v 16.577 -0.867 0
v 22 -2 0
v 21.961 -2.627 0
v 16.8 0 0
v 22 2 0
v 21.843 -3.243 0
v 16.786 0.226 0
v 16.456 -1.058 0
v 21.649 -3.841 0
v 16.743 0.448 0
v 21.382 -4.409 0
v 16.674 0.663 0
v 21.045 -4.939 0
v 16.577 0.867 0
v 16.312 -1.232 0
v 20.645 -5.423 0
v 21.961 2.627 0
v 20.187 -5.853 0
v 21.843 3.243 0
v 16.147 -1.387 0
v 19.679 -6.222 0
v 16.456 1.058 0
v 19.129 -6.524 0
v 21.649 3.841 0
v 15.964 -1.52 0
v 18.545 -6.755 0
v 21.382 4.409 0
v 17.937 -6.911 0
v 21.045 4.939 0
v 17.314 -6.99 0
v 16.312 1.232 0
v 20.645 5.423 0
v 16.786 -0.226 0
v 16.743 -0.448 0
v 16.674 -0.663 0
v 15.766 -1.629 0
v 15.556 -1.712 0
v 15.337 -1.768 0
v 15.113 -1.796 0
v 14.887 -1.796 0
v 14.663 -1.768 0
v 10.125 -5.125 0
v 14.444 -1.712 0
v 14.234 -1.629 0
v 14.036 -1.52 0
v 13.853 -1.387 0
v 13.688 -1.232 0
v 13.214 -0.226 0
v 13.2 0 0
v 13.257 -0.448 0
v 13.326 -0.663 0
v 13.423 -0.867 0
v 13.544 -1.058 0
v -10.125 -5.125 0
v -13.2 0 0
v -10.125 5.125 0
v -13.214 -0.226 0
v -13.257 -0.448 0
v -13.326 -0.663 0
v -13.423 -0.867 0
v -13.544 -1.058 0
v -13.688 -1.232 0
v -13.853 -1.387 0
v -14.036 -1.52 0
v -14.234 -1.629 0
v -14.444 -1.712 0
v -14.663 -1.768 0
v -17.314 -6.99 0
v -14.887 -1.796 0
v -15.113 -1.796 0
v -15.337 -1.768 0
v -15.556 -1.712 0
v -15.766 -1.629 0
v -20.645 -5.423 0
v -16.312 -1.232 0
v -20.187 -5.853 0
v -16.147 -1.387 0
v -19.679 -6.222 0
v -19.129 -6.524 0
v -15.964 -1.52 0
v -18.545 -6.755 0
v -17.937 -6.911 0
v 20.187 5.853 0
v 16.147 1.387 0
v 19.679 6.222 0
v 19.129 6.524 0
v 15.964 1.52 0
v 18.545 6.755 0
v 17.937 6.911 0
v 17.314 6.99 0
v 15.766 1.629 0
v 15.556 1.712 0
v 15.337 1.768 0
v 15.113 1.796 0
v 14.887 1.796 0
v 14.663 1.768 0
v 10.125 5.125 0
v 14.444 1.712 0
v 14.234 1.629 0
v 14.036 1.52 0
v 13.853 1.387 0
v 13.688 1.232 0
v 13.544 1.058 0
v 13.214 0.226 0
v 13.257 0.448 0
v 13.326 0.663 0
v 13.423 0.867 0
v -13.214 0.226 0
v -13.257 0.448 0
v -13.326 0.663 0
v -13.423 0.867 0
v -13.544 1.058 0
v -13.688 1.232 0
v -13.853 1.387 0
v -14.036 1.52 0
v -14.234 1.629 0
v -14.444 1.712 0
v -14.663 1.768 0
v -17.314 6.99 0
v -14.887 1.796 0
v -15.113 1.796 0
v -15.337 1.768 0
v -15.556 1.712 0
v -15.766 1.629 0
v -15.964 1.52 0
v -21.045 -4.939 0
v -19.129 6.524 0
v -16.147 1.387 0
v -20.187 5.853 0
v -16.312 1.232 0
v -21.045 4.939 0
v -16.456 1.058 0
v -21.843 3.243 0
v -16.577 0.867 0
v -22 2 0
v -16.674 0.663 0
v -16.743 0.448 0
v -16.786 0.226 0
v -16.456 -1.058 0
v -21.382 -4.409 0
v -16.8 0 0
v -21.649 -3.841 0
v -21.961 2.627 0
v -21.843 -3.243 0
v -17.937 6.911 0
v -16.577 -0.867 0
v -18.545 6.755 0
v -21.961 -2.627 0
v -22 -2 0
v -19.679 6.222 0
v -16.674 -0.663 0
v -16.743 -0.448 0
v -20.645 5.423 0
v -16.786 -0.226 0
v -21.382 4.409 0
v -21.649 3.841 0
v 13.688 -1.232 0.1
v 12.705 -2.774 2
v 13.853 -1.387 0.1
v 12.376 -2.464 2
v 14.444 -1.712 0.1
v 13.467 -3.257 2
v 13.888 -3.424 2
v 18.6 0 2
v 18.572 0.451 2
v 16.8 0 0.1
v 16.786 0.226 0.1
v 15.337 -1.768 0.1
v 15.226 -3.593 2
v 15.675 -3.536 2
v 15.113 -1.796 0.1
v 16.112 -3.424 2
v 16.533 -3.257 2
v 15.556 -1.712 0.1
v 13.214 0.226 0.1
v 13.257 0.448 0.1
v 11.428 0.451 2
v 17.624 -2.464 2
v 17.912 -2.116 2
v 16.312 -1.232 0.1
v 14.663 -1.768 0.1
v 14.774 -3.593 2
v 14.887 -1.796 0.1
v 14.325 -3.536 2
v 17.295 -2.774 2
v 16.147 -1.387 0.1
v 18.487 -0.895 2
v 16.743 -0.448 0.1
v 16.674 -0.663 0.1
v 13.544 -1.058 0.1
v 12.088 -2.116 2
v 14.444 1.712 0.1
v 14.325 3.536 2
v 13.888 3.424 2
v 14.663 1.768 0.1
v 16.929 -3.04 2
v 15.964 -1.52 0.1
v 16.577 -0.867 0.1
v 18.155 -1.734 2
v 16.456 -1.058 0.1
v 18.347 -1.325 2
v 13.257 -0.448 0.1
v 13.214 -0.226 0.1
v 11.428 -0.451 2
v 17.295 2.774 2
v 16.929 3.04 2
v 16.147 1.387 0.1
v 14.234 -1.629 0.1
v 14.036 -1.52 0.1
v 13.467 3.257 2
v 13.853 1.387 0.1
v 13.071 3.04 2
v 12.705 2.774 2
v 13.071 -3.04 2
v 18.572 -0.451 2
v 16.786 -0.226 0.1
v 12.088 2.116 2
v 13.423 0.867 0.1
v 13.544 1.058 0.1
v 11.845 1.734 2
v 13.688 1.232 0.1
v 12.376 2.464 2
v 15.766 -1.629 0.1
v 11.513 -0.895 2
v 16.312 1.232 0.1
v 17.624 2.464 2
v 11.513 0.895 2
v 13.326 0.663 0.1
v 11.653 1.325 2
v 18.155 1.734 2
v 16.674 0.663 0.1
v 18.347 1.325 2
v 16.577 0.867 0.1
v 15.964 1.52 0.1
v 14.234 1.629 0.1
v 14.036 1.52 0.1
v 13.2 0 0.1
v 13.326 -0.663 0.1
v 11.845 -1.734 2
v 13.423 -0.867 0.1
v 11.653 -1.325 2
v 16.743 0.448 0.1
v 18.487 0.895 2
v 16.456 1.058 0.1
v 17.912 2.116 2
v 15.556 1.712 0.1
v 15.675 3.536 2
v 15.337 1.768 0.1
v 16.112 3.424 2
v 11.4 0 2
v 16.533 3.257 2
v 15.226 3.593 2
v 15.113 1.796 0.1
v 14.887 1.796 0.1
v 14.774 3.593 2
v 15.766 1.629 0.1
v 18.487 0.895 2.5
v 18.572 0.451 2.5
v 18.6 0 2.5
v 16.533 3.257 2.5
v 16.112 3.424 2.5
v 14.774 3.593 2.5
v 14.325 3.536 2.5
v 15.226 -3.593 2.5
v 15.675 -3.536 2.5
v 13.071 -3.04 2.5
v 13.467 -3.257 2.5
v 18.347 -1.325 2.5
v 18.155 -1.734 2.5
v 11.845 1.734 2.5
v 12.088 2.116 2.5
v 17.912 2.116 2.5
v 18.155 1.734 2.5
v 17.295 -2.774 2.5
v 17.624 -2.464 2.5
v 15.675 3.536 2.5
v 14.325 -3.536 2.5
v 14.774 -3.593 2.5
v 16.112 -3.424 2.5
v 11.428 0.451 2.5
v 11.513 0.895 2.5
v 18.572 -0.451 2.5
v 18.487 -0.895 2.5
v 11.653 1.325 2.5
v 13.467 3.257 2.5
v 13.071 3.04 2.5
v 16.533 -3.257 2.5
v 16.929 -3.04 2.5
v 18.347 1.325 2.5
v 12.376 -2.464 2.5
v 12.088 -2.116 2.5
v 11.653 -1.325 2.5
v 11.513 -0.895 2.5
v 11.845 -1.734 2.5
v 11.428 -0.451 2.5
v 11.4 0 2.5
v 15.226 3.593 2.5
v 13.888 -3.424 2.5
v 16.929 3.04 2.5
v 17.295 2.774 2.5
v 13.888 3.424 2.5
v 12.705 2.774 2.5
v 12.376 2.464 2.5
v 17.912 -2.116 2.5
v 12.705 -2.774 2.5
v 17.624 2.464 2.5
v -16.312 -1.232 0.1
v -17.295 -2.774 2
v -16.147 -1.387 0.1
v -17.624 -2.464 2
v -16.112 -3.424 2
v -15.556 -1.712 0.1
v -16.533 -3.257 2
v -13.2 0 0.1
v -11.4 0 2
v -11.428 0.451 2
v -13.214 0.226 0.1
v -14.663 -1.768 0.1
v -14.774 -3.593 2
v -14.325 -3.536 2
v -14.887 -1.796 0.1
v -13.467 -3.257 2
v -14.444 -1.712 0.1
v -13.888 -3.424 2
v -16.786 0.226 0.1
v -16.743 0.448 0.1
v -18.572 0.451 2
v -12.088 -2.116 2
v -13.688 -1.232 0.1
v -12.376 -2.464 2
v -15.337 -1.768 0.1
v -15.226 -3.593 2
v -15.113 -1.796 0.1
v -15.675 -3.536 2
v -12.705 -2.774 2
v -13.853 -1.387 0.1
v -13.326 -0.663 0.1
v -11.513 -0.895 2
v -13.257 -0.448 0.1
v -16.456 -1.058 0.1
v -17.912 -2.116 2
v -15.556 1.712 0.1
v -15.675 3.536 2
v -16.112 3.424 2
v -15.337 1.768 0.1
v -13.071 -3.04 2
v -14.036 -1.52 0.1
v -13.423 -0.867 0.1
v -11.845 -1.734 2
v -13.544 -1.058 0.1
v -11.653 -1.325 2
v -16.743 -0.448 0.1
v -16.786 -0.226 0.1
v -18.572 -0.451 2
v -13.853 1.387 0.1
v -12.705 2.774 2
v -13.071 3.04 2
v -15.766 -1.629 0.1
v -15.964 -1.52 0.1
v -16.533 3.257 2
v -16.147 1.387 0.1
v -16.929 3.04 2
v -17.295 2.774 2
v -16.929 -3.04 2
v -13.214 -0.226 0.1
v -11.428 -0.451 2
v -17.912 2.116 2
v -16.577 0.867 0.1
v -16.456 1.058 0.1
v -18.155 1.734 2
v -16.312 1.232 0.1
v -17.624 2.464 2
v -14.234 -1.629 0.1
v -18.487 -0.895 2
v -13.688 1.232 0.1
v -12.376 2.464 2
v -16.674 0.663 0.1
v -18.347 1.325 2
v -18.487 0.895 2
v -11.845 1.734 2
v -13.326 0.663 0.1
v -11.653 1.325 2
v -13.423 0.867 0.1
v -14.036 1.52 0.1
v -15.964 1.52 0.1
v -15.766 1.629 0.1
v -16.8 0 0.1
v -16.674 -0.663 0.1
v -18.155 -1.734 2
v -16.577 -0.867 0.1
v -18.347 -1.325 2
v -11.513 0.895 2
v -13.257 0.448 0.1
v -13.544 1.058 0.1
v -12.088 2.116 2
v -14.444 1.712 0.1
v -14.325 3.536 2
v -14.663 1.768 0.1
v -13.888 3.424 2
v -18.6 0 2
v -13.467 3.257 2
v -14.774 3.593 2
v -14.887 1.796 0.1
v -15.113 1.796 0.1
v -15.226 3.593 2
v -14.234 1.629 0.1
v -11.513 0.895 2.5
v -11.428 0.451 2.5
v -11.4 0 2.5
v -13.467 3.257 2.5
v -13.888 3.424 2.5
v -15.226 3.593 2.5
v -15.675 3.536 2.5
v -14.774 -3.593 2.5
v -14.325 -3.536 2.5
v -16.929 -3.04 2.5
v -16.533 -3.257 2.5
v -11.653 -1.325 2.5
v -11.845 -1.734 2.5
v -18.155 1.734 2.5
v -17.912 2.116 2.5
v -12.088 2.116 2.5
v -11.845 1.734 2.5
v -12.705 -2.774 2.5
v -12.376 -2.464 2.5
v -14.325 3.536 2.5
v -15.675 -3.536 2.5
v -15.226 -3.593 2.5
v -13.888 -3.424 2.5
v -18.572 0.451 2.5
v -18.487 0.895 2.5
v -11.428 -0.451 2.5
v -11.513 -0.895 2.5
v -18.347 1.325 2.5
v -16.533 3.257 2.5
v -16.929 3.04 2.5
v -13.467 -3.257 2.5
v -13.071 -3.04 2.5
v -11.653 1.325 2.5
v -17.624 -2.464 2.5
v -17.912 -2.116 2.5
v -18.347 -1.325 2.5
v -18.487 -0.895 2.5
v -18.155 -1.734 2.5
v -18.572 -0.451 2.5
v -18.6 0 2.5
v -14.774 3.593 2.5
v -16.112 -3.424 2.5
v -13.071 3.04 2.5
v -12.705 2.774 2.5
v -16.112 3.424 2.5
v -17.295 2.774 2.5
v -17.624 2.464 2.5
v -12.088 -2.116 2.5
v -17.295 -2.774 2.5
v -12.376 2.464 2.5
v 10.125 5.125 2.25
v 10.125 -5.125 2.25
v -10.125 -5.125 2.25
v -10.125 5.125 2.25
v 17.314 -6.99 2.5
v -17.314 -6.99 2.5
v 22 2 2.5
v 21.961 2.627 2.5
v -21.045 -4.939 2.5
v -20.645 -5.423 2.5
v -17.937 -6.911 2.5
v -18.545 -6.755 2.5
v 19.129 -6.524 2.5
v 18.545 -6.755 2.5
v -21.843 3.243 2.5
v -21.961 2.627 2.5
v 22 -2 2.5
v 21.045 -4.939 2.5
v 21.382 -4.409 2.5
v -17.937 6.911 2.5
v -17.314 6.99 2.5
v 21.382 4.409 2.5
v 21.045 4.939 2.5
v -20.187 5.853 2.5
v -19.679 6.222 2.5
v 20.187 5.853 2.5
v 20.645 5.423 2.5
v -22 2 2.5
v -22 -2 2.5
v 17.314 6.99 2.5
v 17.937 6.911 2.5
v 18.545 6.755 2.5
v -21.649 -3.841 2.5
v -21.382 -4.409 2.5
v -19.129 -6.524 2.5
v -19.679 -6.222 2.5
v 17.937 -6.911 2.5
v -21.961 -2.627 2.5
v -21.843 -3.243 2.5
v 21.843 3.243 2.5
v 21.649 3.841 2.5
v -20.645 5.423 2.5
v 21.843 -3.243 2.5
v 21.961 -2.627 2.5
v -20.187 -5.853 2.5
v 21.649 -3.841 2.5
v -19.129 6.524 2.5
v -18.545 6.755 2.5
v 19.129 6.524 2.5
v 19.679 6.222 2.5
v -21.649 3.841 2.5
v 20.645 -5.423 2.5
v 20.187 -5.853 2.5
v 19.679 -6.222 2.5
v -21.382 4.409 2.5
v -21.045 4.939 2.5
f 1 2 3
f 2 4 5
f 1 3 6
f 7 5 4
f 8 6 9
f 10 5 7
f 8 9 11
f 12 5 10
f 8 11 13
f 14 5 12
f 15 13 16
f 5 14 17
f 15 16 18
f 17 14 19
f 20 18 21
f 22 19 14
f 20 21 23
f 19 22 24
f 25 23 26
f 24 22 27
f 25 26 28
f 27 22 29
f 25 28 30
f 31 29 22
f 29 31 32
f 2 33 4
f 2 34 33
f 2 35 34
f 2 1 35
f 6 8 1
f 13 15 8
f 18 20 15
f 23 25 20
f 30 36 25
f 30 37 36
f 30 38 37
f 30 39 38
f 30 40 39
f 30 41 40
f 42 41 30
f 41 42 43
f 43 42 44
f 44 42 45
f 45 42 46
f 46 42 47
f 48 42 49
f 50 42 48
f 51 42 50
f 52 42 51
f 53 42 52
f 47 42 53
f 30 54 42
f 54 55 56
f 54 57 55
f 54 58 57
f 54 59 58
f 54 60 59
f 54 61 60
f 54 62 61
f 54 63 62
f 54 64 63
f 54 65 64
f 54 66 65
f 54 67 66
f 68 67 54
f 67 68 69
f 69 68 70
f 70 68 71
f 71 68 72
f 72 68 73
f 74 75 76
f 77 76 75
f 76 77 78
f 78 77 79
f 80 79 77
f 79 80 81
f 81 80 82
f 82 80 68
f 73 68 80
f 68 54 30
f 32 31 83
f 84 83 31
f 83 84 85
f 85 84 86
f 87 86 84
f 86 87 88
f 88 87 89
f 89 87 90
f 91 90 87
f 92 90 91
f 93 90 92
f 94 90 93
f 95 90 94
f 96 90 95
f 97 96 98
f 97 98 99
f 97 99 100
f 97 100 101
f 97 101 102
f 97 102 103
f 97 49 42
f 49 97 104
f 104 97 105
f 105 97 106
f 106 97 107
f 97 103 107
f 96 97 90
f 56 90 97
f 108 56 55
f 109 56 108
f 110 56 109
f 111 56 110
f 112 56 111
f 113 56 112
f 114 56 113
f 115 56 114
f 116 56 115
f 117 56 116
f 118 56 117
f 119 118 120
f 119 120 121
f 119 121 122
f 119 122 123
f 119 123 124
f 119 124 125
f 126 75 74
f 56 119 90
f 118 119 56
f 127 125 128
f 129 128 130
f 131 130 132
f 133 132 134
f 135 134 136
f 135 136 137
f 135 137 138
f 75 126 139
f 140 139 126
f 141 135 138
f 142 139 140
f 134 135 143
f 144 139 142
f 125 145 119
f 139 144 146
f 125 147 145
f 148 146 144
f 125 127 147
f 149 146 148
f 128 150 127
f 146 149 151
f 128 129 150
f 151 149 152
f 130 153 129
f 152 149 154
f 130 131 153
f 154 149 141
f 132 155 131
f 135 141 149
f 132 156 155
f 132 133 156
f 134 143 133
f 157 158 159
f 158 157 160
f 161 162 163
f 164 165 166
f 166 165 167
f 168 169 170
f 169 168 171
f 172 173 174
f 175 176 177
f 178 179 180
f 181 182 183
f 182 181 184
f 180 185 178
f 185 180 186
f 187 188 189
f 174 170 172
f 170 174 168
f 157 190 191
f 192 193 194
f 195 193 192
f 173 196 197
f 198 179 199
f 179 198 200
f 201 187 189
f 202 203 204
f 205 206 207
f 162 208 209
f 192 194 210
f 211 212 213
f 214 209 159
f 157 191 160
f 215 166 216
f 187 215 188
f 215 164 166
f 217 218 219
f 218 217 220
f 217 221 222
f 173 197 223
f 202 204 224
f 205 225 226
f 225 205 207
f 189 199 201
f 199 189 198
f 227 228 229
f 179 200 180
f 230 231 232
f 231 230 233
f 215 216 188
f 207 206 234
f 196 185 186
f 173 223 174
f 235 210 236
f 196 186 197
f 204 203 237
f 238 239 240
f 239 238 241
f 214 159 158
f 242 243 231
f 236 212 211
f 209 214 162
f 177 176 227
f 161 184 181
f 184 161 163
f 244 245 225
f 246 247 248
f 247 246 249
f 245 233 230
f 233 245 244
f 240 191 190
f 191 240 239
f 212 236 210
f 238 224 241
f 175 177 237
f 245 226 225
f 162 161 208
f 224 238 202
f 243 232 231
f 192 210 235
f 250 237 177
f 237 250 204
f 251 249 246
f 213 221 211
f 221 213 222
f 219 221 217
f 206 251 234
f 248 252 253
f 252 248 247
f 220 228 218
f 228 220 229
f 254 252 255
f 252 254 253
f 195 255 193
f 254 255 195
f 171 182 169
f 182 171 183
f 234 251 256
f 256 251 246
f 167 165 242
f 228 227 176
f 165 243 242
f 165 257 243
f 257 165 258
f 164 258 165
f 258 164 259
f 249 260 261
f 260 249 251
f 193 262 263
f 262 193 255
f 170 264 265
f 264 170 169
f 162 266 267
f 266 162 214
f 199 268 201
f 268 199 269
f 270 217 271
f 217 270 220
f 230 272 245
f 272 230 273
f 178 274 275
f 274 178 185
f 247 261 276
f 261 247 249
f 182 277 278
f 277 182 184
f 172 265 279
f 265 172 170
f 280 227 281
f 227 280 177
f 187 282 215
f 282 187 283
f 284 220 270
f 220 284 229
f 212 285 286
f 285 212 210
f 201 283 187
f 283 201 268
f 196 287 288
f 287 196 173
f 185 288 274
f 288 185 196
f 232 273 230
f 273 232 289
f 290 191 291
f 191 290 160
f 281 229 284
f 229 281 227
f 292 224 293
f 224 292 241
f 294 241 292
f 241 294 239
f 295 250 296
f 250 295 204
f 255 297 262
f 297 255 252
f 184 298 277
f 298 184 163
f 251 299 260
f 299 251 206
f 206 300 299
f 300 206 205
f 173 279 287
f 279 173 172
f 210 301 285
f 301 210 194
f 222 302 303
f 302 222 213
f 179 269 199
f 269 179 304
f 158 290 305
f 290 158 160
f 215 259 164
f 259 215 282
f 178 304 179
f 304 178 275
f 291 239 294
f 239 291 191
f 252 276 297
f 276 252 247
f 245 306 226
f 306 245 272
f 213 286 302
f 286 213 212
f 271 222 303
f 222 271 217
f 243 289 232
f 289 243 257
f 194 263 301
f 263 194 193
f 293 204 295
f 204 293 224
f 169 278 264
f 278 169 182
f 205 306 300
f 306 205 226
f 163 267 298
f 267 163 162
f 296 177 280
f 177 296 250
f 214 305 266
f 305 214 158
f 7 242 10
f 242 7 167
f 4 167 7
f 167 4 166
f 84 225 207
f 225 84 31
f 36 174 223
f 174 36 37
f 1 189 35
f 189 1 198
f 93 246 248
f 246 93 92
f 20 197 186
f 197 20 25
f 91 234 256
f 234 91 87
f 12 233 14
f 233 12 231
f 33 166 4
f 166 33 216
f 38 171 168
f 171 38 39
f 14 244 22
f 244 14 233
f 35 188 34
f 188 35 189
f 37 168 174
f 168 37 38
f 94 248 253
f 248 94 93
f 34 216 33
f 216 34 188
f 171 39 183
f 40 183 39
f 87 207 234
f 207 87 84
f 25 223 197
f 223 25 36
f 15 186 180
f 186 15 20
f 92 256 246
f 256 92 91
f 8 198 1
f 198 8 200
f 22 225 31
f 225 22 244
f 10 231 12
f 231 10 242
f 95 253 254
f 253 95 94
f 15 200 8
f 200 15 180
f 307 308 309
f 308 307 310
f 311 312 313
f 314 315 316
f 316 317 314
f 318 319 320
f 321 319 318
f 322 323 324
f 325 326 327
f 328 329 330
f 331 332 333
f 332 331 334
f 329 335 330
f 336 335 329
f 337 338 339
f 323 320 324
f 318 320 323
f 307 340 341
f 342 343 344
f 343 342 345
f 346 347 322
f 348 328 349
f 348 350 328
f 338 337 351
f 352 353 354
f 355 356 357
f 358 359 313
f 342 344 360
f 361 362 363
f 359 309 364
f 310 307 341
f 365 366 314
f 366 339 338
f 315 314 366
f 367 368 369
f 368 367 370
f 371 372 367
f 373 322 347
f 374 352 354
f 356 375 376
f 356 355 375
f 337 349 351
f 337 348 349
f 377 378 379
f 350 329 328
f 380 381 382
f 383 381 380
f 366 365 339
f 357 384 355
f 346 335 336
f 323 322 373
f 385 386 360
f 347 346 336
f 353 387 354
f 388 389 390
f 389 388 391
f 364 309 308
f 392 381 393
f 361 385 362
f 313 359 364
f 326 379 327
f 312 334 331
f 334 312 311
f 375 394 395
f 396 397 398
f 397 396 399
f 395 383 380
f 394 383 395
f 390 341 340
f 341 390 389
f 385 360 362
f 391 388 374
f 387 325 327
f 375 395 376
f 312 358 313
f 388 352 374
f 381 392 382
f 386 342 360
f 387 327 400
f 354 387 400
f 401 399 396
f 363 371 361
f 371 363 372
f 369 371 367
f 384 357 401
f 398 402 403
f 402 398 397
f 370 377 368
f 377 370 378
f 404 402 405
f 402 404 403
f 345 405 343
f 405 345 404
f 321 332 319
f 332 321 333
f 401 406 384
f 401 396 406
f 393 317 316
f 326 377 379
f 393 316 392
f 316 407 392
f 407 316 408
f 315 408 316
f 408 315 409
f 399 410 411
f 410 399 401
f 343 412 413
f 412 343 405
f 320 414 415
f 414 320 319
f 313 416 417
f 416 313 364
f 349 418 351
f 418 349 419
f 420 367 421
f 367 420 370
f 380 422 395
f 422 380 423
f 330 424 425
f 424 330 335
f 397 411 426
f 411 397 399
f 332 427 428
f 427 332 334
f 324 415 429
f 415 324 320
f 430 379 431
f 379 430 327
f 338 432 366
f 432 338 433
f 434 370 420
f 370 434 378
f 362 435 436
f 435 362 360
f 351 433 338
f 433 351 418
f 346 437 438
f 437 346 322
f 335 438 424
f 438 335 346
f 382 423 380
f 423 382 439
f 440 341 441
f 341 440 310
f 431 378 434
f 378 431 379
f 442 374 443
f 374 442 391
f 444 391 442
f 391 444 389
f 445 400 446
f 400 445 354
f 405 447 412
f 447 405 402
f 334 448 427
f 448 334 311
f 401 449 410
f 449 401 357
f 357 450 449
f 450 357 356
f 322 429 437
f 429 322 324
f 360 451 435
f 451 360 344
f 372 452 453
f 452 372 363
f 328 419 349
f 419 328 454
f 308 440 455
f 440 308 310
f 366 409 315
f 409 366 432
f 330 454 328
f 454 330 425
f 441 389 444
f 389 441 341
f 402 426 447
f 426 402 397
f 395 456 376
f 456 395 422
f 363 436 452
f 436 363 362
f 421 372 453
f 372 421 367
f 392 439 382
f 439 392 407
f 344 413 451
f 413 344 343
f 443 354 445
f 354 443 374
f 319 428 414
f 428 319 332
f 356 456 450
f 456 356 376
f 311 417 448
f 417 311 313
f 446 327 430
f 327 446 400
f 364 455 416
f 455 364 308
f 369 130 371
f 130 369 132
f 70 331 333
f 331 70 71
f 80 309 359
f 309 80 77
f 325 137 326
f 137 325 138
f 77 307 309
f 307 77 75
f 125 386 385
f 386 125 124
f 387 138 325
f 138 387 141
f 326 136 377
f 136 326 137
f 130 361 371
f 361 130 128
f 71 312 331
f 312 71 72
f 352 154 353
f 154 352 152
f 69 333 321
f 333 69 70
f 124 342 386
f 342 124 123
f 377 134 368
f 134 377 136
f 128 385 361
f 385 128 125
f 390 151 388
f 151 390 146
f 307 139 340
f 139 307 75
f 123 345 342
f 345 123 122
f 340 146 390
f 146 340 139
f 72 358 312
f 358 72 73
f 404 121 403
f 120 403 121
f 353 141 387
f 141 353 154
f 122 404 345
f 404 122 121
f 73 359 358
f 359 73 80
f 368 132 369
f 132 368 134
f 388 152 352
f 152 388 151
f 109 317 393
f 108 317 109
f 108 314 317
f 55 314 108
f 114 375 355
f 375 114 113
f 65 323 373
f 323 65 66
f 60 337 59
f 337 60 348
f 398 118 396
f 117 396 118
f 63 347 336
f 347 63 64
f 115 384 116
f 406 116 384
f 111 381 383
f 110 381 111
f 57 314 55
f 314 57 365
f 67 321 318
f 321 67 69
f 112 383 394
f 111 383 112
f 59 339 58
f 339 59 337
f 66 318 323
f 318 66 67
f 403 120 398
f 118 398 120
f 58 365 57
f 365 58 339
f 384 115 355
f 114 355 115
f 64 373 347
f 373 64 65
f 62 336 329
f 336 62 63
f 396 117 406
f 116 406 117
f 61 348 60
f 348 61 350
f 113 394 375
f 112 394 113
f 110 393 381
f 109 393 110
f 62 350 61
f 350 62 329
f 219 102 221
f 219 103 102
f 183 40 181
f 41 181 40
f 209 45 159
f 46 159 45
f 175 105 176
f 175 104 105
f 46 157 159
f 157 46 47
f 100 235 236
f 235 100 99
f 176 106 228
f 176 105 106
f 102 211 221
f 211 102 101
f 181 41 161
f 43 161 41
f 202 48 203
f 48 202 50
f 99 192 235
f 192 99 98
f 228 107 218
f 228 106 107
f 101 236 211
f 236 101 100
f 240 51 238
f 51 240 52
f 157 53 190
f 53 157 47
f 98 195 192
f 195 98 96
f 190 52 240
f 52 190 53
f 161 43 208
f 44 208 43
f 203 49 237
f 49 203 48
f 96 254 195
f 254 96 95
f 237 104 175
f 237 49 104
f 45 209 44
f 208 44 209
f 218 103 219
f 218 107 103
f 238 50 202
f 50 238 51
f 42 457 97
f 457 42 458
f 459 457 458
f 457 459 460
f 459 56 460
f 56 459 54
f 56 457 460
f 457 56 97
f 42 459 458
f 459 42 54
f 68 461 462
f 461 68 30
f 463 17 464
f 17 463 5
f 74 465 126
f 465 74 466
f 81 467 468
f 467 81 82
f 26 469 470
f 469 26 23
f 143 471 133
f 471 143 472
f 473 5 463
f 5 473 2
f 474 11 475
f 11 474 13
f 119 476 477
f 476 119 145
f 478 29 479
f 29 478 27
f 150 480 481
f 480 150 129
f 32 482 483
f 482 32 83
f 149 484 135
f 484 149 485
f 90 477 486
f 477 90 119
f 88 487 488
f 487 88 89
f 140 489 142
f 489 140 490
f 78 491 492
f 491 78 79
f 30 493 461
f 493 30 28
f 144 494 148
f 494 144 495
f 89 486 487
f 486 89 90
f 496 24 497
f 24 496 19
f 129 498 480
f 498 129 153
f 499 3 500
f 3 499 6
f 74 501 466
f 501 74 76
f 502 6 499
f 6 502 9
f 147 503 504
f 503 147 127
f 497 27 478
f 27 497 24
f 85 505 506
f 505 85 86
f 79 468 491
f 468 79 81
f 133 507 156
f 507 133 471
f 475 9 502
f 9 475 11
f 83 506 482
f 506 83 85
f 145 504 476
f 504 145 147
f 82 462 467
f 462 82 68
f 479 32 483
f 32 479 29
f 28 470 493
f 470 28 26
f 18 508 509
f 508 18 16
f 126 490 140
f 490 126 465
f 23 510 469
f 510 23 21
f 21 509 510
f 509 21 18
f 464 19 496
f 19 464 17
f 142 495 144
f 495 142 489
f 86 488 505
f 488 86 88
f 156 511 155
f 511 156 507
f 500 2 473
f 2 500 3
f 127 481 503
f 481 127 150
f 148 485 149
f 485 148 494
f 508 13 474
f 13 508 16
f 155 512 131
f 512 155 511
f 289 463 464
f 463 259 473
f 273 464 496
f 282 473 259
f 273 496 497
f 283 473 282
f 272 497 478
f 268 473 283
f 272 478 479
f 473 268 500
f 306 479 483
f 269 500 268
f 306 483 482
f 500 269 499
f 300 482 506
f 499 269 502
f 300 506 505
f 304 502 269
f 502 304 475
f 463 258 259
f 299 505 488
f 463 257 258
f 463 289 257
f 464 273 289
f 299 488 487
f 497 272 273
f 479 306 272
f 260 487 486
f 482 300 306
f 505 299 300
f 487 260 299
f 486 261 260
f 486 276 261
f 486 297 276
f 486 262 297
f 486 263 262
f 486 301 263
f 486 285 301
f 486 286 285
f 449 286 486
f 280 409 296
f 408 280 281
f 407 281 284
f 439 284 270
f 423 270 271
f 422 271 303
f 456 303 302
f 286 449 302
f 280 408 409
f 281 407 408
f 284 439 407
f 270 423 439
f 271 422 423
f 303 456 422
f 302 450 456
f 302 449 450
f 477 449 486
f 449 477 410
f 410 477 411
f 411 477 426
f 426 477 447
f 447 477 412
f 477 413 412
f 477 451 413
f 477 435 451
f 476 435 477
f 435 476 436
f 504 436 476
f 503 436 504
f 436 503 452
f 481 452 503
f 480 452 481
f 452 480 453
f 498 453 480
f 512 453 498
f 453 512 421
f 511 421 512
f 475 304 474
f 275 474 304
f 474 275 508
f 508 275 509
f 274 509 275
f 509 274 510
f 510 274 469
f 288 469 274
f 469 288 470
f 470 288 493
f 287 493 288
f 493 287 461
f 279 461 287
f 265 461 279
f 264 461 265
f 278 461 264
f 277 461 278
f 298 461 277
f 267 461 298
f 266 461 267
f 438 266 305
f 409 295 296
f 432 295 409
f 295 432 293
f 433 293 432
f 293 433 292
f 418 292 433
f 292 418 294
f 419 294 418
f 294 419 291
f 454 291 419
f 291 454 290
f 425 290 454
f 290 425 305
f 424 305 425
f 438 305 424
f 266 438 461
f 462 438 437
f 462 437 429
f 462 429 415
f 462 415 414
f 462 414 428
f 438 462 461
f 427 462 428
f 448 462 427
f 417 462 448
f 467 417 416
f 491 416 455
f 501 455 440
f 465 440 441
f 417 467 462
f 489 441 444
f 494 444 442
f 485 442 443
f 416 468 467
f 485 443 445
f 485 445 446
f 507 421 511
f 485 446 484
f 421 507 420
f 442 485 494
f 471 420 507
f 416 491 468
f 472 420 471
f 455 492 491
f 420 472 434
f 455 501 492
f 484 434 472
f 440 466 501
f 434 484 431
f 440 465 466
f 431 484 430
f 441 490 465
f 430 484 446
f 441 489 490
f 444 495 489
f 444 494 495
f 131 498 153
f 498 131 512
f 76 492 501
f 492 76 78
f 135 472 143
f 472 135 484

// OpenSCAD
$fn = 50;


difference() {
	union() {
		hull() {
			translate(v = [-17.0000000000, 2.0000000000, 0]) {
				cylinder(h = 2.5000000000, r = 5);
			}
			translate(v = [17.0000000000, 2.0000000000, 0]) {
				cylinder(h = 2.5000000000, r = 5);
			}
			translate(v = [-17.0000000000, -2.0000000000, 0]) {
				cylinder(h = 2.5000000000, r = 5);
			}
			translate(v = [17.0000000000, -2.0000000000, 0]) {
				cylinder(h = 2.5000000000, r = 5);
			}
		}
	}
	union() {
		translate(v = [15.0000000000, 0, 2.0000000000]) {
			rotate(a = [0, 0, 0]) {
				difference() {
					union() {
						translate(v = [0, 0, -2.0000000000]) {
							cylinder(h = 2.0000000000, r = 1.5000000000);
						}
						translate(v = [0, 0, -1.9000000000]) {
							cylinder(h = 1.9000000000, r1 = 1.8000000000, r2 = 3.6000000000);
						}
						cylinder(h = 250, r = 3.6000000000);
						translate(v = [0, 0, -2.0000000000]) {
							cylinder(h = 2.0000000000, r = 1.8000000000);
						}
						translate(v = [0, 0, -2.0000000000]) {
							cylinder(h = 2.0000000000, r = 1.5000000000);
						}
					}
					union();
				}
			}
		}
		translate(v = [-15.0000000000, 0, 2.0000000000]) {
			rotate(a = [0, 0, 0]) {
				difference() {
					union() {
						translate(v = [0, 0, -2.0000000000]) {
							cylinder(h = 2.0000000000, r = 1.5000000000);
						}
						translate(v = [0, 0, -1.9000000000]) {
							cylinder(h = 1.9000000000, r1 = 1.8000000000, r2 = 3.6000000000);
						}
						cylinder(h = 250, r = 3.6000000000);
						translate(v = [0, 0, -2.0000000000]) {
							cylinder(h = 2.0000000000, r = 1.8000000000);
						}
						translate(v = [0, 0, -2.0000000000]) {
							cylinder(h = 2.0000000000, r = 1.5000000000);
						}
					}
					union();
				}
			}
		}
		translate(v = [-15.0000000000, 0.0000000000, 0]) {
			cylinder(h = 2.5000000000, r = 1.8000000000);
		}
		translate(v = [15.0000000000, 0.0000000000, 0]) {
			cylinder(h = 2.5000000000, r = 1.8000000000);
		}
		translate(v = [-15.0000000000, 0.0000000000, 0]) {
			cylinder(h = 2.5000000000, r = 1.8000000000);
		}
		translate(v = [15.0000000000, 0.0000000000, 0]) {
			cylinder(h = 2.5000000000, r = 1.8000000000);
		}
		translate(v = [-15.0000000000, 0.0000000000, 0]) {
			cylinder(h = 2.5000000000, r = 1.8000000000);
		}
		translate(v = [15.0000000000, 0.0000000000, 0]) {
			cylinder(h = 2.5000000000, r = 1.8000000000);
		}
		translate(v = [-15.0000000000, 0.0000000000, 0]) {
			cylinder(h = 2.5000000000, r = 1.8000000000);
		}
		translate(v = [15.0000000000, 0.0000000000, 0]) {
			cylinder(h = 2.5000000000, r = 1.8000000000);
		}
		#translate(v = [-10.1250000000, -5.1250000000, 0]) {
			cube(size = [20.2500000000, 10.2500000000, 2.2500000000]);
		}
	}
}
